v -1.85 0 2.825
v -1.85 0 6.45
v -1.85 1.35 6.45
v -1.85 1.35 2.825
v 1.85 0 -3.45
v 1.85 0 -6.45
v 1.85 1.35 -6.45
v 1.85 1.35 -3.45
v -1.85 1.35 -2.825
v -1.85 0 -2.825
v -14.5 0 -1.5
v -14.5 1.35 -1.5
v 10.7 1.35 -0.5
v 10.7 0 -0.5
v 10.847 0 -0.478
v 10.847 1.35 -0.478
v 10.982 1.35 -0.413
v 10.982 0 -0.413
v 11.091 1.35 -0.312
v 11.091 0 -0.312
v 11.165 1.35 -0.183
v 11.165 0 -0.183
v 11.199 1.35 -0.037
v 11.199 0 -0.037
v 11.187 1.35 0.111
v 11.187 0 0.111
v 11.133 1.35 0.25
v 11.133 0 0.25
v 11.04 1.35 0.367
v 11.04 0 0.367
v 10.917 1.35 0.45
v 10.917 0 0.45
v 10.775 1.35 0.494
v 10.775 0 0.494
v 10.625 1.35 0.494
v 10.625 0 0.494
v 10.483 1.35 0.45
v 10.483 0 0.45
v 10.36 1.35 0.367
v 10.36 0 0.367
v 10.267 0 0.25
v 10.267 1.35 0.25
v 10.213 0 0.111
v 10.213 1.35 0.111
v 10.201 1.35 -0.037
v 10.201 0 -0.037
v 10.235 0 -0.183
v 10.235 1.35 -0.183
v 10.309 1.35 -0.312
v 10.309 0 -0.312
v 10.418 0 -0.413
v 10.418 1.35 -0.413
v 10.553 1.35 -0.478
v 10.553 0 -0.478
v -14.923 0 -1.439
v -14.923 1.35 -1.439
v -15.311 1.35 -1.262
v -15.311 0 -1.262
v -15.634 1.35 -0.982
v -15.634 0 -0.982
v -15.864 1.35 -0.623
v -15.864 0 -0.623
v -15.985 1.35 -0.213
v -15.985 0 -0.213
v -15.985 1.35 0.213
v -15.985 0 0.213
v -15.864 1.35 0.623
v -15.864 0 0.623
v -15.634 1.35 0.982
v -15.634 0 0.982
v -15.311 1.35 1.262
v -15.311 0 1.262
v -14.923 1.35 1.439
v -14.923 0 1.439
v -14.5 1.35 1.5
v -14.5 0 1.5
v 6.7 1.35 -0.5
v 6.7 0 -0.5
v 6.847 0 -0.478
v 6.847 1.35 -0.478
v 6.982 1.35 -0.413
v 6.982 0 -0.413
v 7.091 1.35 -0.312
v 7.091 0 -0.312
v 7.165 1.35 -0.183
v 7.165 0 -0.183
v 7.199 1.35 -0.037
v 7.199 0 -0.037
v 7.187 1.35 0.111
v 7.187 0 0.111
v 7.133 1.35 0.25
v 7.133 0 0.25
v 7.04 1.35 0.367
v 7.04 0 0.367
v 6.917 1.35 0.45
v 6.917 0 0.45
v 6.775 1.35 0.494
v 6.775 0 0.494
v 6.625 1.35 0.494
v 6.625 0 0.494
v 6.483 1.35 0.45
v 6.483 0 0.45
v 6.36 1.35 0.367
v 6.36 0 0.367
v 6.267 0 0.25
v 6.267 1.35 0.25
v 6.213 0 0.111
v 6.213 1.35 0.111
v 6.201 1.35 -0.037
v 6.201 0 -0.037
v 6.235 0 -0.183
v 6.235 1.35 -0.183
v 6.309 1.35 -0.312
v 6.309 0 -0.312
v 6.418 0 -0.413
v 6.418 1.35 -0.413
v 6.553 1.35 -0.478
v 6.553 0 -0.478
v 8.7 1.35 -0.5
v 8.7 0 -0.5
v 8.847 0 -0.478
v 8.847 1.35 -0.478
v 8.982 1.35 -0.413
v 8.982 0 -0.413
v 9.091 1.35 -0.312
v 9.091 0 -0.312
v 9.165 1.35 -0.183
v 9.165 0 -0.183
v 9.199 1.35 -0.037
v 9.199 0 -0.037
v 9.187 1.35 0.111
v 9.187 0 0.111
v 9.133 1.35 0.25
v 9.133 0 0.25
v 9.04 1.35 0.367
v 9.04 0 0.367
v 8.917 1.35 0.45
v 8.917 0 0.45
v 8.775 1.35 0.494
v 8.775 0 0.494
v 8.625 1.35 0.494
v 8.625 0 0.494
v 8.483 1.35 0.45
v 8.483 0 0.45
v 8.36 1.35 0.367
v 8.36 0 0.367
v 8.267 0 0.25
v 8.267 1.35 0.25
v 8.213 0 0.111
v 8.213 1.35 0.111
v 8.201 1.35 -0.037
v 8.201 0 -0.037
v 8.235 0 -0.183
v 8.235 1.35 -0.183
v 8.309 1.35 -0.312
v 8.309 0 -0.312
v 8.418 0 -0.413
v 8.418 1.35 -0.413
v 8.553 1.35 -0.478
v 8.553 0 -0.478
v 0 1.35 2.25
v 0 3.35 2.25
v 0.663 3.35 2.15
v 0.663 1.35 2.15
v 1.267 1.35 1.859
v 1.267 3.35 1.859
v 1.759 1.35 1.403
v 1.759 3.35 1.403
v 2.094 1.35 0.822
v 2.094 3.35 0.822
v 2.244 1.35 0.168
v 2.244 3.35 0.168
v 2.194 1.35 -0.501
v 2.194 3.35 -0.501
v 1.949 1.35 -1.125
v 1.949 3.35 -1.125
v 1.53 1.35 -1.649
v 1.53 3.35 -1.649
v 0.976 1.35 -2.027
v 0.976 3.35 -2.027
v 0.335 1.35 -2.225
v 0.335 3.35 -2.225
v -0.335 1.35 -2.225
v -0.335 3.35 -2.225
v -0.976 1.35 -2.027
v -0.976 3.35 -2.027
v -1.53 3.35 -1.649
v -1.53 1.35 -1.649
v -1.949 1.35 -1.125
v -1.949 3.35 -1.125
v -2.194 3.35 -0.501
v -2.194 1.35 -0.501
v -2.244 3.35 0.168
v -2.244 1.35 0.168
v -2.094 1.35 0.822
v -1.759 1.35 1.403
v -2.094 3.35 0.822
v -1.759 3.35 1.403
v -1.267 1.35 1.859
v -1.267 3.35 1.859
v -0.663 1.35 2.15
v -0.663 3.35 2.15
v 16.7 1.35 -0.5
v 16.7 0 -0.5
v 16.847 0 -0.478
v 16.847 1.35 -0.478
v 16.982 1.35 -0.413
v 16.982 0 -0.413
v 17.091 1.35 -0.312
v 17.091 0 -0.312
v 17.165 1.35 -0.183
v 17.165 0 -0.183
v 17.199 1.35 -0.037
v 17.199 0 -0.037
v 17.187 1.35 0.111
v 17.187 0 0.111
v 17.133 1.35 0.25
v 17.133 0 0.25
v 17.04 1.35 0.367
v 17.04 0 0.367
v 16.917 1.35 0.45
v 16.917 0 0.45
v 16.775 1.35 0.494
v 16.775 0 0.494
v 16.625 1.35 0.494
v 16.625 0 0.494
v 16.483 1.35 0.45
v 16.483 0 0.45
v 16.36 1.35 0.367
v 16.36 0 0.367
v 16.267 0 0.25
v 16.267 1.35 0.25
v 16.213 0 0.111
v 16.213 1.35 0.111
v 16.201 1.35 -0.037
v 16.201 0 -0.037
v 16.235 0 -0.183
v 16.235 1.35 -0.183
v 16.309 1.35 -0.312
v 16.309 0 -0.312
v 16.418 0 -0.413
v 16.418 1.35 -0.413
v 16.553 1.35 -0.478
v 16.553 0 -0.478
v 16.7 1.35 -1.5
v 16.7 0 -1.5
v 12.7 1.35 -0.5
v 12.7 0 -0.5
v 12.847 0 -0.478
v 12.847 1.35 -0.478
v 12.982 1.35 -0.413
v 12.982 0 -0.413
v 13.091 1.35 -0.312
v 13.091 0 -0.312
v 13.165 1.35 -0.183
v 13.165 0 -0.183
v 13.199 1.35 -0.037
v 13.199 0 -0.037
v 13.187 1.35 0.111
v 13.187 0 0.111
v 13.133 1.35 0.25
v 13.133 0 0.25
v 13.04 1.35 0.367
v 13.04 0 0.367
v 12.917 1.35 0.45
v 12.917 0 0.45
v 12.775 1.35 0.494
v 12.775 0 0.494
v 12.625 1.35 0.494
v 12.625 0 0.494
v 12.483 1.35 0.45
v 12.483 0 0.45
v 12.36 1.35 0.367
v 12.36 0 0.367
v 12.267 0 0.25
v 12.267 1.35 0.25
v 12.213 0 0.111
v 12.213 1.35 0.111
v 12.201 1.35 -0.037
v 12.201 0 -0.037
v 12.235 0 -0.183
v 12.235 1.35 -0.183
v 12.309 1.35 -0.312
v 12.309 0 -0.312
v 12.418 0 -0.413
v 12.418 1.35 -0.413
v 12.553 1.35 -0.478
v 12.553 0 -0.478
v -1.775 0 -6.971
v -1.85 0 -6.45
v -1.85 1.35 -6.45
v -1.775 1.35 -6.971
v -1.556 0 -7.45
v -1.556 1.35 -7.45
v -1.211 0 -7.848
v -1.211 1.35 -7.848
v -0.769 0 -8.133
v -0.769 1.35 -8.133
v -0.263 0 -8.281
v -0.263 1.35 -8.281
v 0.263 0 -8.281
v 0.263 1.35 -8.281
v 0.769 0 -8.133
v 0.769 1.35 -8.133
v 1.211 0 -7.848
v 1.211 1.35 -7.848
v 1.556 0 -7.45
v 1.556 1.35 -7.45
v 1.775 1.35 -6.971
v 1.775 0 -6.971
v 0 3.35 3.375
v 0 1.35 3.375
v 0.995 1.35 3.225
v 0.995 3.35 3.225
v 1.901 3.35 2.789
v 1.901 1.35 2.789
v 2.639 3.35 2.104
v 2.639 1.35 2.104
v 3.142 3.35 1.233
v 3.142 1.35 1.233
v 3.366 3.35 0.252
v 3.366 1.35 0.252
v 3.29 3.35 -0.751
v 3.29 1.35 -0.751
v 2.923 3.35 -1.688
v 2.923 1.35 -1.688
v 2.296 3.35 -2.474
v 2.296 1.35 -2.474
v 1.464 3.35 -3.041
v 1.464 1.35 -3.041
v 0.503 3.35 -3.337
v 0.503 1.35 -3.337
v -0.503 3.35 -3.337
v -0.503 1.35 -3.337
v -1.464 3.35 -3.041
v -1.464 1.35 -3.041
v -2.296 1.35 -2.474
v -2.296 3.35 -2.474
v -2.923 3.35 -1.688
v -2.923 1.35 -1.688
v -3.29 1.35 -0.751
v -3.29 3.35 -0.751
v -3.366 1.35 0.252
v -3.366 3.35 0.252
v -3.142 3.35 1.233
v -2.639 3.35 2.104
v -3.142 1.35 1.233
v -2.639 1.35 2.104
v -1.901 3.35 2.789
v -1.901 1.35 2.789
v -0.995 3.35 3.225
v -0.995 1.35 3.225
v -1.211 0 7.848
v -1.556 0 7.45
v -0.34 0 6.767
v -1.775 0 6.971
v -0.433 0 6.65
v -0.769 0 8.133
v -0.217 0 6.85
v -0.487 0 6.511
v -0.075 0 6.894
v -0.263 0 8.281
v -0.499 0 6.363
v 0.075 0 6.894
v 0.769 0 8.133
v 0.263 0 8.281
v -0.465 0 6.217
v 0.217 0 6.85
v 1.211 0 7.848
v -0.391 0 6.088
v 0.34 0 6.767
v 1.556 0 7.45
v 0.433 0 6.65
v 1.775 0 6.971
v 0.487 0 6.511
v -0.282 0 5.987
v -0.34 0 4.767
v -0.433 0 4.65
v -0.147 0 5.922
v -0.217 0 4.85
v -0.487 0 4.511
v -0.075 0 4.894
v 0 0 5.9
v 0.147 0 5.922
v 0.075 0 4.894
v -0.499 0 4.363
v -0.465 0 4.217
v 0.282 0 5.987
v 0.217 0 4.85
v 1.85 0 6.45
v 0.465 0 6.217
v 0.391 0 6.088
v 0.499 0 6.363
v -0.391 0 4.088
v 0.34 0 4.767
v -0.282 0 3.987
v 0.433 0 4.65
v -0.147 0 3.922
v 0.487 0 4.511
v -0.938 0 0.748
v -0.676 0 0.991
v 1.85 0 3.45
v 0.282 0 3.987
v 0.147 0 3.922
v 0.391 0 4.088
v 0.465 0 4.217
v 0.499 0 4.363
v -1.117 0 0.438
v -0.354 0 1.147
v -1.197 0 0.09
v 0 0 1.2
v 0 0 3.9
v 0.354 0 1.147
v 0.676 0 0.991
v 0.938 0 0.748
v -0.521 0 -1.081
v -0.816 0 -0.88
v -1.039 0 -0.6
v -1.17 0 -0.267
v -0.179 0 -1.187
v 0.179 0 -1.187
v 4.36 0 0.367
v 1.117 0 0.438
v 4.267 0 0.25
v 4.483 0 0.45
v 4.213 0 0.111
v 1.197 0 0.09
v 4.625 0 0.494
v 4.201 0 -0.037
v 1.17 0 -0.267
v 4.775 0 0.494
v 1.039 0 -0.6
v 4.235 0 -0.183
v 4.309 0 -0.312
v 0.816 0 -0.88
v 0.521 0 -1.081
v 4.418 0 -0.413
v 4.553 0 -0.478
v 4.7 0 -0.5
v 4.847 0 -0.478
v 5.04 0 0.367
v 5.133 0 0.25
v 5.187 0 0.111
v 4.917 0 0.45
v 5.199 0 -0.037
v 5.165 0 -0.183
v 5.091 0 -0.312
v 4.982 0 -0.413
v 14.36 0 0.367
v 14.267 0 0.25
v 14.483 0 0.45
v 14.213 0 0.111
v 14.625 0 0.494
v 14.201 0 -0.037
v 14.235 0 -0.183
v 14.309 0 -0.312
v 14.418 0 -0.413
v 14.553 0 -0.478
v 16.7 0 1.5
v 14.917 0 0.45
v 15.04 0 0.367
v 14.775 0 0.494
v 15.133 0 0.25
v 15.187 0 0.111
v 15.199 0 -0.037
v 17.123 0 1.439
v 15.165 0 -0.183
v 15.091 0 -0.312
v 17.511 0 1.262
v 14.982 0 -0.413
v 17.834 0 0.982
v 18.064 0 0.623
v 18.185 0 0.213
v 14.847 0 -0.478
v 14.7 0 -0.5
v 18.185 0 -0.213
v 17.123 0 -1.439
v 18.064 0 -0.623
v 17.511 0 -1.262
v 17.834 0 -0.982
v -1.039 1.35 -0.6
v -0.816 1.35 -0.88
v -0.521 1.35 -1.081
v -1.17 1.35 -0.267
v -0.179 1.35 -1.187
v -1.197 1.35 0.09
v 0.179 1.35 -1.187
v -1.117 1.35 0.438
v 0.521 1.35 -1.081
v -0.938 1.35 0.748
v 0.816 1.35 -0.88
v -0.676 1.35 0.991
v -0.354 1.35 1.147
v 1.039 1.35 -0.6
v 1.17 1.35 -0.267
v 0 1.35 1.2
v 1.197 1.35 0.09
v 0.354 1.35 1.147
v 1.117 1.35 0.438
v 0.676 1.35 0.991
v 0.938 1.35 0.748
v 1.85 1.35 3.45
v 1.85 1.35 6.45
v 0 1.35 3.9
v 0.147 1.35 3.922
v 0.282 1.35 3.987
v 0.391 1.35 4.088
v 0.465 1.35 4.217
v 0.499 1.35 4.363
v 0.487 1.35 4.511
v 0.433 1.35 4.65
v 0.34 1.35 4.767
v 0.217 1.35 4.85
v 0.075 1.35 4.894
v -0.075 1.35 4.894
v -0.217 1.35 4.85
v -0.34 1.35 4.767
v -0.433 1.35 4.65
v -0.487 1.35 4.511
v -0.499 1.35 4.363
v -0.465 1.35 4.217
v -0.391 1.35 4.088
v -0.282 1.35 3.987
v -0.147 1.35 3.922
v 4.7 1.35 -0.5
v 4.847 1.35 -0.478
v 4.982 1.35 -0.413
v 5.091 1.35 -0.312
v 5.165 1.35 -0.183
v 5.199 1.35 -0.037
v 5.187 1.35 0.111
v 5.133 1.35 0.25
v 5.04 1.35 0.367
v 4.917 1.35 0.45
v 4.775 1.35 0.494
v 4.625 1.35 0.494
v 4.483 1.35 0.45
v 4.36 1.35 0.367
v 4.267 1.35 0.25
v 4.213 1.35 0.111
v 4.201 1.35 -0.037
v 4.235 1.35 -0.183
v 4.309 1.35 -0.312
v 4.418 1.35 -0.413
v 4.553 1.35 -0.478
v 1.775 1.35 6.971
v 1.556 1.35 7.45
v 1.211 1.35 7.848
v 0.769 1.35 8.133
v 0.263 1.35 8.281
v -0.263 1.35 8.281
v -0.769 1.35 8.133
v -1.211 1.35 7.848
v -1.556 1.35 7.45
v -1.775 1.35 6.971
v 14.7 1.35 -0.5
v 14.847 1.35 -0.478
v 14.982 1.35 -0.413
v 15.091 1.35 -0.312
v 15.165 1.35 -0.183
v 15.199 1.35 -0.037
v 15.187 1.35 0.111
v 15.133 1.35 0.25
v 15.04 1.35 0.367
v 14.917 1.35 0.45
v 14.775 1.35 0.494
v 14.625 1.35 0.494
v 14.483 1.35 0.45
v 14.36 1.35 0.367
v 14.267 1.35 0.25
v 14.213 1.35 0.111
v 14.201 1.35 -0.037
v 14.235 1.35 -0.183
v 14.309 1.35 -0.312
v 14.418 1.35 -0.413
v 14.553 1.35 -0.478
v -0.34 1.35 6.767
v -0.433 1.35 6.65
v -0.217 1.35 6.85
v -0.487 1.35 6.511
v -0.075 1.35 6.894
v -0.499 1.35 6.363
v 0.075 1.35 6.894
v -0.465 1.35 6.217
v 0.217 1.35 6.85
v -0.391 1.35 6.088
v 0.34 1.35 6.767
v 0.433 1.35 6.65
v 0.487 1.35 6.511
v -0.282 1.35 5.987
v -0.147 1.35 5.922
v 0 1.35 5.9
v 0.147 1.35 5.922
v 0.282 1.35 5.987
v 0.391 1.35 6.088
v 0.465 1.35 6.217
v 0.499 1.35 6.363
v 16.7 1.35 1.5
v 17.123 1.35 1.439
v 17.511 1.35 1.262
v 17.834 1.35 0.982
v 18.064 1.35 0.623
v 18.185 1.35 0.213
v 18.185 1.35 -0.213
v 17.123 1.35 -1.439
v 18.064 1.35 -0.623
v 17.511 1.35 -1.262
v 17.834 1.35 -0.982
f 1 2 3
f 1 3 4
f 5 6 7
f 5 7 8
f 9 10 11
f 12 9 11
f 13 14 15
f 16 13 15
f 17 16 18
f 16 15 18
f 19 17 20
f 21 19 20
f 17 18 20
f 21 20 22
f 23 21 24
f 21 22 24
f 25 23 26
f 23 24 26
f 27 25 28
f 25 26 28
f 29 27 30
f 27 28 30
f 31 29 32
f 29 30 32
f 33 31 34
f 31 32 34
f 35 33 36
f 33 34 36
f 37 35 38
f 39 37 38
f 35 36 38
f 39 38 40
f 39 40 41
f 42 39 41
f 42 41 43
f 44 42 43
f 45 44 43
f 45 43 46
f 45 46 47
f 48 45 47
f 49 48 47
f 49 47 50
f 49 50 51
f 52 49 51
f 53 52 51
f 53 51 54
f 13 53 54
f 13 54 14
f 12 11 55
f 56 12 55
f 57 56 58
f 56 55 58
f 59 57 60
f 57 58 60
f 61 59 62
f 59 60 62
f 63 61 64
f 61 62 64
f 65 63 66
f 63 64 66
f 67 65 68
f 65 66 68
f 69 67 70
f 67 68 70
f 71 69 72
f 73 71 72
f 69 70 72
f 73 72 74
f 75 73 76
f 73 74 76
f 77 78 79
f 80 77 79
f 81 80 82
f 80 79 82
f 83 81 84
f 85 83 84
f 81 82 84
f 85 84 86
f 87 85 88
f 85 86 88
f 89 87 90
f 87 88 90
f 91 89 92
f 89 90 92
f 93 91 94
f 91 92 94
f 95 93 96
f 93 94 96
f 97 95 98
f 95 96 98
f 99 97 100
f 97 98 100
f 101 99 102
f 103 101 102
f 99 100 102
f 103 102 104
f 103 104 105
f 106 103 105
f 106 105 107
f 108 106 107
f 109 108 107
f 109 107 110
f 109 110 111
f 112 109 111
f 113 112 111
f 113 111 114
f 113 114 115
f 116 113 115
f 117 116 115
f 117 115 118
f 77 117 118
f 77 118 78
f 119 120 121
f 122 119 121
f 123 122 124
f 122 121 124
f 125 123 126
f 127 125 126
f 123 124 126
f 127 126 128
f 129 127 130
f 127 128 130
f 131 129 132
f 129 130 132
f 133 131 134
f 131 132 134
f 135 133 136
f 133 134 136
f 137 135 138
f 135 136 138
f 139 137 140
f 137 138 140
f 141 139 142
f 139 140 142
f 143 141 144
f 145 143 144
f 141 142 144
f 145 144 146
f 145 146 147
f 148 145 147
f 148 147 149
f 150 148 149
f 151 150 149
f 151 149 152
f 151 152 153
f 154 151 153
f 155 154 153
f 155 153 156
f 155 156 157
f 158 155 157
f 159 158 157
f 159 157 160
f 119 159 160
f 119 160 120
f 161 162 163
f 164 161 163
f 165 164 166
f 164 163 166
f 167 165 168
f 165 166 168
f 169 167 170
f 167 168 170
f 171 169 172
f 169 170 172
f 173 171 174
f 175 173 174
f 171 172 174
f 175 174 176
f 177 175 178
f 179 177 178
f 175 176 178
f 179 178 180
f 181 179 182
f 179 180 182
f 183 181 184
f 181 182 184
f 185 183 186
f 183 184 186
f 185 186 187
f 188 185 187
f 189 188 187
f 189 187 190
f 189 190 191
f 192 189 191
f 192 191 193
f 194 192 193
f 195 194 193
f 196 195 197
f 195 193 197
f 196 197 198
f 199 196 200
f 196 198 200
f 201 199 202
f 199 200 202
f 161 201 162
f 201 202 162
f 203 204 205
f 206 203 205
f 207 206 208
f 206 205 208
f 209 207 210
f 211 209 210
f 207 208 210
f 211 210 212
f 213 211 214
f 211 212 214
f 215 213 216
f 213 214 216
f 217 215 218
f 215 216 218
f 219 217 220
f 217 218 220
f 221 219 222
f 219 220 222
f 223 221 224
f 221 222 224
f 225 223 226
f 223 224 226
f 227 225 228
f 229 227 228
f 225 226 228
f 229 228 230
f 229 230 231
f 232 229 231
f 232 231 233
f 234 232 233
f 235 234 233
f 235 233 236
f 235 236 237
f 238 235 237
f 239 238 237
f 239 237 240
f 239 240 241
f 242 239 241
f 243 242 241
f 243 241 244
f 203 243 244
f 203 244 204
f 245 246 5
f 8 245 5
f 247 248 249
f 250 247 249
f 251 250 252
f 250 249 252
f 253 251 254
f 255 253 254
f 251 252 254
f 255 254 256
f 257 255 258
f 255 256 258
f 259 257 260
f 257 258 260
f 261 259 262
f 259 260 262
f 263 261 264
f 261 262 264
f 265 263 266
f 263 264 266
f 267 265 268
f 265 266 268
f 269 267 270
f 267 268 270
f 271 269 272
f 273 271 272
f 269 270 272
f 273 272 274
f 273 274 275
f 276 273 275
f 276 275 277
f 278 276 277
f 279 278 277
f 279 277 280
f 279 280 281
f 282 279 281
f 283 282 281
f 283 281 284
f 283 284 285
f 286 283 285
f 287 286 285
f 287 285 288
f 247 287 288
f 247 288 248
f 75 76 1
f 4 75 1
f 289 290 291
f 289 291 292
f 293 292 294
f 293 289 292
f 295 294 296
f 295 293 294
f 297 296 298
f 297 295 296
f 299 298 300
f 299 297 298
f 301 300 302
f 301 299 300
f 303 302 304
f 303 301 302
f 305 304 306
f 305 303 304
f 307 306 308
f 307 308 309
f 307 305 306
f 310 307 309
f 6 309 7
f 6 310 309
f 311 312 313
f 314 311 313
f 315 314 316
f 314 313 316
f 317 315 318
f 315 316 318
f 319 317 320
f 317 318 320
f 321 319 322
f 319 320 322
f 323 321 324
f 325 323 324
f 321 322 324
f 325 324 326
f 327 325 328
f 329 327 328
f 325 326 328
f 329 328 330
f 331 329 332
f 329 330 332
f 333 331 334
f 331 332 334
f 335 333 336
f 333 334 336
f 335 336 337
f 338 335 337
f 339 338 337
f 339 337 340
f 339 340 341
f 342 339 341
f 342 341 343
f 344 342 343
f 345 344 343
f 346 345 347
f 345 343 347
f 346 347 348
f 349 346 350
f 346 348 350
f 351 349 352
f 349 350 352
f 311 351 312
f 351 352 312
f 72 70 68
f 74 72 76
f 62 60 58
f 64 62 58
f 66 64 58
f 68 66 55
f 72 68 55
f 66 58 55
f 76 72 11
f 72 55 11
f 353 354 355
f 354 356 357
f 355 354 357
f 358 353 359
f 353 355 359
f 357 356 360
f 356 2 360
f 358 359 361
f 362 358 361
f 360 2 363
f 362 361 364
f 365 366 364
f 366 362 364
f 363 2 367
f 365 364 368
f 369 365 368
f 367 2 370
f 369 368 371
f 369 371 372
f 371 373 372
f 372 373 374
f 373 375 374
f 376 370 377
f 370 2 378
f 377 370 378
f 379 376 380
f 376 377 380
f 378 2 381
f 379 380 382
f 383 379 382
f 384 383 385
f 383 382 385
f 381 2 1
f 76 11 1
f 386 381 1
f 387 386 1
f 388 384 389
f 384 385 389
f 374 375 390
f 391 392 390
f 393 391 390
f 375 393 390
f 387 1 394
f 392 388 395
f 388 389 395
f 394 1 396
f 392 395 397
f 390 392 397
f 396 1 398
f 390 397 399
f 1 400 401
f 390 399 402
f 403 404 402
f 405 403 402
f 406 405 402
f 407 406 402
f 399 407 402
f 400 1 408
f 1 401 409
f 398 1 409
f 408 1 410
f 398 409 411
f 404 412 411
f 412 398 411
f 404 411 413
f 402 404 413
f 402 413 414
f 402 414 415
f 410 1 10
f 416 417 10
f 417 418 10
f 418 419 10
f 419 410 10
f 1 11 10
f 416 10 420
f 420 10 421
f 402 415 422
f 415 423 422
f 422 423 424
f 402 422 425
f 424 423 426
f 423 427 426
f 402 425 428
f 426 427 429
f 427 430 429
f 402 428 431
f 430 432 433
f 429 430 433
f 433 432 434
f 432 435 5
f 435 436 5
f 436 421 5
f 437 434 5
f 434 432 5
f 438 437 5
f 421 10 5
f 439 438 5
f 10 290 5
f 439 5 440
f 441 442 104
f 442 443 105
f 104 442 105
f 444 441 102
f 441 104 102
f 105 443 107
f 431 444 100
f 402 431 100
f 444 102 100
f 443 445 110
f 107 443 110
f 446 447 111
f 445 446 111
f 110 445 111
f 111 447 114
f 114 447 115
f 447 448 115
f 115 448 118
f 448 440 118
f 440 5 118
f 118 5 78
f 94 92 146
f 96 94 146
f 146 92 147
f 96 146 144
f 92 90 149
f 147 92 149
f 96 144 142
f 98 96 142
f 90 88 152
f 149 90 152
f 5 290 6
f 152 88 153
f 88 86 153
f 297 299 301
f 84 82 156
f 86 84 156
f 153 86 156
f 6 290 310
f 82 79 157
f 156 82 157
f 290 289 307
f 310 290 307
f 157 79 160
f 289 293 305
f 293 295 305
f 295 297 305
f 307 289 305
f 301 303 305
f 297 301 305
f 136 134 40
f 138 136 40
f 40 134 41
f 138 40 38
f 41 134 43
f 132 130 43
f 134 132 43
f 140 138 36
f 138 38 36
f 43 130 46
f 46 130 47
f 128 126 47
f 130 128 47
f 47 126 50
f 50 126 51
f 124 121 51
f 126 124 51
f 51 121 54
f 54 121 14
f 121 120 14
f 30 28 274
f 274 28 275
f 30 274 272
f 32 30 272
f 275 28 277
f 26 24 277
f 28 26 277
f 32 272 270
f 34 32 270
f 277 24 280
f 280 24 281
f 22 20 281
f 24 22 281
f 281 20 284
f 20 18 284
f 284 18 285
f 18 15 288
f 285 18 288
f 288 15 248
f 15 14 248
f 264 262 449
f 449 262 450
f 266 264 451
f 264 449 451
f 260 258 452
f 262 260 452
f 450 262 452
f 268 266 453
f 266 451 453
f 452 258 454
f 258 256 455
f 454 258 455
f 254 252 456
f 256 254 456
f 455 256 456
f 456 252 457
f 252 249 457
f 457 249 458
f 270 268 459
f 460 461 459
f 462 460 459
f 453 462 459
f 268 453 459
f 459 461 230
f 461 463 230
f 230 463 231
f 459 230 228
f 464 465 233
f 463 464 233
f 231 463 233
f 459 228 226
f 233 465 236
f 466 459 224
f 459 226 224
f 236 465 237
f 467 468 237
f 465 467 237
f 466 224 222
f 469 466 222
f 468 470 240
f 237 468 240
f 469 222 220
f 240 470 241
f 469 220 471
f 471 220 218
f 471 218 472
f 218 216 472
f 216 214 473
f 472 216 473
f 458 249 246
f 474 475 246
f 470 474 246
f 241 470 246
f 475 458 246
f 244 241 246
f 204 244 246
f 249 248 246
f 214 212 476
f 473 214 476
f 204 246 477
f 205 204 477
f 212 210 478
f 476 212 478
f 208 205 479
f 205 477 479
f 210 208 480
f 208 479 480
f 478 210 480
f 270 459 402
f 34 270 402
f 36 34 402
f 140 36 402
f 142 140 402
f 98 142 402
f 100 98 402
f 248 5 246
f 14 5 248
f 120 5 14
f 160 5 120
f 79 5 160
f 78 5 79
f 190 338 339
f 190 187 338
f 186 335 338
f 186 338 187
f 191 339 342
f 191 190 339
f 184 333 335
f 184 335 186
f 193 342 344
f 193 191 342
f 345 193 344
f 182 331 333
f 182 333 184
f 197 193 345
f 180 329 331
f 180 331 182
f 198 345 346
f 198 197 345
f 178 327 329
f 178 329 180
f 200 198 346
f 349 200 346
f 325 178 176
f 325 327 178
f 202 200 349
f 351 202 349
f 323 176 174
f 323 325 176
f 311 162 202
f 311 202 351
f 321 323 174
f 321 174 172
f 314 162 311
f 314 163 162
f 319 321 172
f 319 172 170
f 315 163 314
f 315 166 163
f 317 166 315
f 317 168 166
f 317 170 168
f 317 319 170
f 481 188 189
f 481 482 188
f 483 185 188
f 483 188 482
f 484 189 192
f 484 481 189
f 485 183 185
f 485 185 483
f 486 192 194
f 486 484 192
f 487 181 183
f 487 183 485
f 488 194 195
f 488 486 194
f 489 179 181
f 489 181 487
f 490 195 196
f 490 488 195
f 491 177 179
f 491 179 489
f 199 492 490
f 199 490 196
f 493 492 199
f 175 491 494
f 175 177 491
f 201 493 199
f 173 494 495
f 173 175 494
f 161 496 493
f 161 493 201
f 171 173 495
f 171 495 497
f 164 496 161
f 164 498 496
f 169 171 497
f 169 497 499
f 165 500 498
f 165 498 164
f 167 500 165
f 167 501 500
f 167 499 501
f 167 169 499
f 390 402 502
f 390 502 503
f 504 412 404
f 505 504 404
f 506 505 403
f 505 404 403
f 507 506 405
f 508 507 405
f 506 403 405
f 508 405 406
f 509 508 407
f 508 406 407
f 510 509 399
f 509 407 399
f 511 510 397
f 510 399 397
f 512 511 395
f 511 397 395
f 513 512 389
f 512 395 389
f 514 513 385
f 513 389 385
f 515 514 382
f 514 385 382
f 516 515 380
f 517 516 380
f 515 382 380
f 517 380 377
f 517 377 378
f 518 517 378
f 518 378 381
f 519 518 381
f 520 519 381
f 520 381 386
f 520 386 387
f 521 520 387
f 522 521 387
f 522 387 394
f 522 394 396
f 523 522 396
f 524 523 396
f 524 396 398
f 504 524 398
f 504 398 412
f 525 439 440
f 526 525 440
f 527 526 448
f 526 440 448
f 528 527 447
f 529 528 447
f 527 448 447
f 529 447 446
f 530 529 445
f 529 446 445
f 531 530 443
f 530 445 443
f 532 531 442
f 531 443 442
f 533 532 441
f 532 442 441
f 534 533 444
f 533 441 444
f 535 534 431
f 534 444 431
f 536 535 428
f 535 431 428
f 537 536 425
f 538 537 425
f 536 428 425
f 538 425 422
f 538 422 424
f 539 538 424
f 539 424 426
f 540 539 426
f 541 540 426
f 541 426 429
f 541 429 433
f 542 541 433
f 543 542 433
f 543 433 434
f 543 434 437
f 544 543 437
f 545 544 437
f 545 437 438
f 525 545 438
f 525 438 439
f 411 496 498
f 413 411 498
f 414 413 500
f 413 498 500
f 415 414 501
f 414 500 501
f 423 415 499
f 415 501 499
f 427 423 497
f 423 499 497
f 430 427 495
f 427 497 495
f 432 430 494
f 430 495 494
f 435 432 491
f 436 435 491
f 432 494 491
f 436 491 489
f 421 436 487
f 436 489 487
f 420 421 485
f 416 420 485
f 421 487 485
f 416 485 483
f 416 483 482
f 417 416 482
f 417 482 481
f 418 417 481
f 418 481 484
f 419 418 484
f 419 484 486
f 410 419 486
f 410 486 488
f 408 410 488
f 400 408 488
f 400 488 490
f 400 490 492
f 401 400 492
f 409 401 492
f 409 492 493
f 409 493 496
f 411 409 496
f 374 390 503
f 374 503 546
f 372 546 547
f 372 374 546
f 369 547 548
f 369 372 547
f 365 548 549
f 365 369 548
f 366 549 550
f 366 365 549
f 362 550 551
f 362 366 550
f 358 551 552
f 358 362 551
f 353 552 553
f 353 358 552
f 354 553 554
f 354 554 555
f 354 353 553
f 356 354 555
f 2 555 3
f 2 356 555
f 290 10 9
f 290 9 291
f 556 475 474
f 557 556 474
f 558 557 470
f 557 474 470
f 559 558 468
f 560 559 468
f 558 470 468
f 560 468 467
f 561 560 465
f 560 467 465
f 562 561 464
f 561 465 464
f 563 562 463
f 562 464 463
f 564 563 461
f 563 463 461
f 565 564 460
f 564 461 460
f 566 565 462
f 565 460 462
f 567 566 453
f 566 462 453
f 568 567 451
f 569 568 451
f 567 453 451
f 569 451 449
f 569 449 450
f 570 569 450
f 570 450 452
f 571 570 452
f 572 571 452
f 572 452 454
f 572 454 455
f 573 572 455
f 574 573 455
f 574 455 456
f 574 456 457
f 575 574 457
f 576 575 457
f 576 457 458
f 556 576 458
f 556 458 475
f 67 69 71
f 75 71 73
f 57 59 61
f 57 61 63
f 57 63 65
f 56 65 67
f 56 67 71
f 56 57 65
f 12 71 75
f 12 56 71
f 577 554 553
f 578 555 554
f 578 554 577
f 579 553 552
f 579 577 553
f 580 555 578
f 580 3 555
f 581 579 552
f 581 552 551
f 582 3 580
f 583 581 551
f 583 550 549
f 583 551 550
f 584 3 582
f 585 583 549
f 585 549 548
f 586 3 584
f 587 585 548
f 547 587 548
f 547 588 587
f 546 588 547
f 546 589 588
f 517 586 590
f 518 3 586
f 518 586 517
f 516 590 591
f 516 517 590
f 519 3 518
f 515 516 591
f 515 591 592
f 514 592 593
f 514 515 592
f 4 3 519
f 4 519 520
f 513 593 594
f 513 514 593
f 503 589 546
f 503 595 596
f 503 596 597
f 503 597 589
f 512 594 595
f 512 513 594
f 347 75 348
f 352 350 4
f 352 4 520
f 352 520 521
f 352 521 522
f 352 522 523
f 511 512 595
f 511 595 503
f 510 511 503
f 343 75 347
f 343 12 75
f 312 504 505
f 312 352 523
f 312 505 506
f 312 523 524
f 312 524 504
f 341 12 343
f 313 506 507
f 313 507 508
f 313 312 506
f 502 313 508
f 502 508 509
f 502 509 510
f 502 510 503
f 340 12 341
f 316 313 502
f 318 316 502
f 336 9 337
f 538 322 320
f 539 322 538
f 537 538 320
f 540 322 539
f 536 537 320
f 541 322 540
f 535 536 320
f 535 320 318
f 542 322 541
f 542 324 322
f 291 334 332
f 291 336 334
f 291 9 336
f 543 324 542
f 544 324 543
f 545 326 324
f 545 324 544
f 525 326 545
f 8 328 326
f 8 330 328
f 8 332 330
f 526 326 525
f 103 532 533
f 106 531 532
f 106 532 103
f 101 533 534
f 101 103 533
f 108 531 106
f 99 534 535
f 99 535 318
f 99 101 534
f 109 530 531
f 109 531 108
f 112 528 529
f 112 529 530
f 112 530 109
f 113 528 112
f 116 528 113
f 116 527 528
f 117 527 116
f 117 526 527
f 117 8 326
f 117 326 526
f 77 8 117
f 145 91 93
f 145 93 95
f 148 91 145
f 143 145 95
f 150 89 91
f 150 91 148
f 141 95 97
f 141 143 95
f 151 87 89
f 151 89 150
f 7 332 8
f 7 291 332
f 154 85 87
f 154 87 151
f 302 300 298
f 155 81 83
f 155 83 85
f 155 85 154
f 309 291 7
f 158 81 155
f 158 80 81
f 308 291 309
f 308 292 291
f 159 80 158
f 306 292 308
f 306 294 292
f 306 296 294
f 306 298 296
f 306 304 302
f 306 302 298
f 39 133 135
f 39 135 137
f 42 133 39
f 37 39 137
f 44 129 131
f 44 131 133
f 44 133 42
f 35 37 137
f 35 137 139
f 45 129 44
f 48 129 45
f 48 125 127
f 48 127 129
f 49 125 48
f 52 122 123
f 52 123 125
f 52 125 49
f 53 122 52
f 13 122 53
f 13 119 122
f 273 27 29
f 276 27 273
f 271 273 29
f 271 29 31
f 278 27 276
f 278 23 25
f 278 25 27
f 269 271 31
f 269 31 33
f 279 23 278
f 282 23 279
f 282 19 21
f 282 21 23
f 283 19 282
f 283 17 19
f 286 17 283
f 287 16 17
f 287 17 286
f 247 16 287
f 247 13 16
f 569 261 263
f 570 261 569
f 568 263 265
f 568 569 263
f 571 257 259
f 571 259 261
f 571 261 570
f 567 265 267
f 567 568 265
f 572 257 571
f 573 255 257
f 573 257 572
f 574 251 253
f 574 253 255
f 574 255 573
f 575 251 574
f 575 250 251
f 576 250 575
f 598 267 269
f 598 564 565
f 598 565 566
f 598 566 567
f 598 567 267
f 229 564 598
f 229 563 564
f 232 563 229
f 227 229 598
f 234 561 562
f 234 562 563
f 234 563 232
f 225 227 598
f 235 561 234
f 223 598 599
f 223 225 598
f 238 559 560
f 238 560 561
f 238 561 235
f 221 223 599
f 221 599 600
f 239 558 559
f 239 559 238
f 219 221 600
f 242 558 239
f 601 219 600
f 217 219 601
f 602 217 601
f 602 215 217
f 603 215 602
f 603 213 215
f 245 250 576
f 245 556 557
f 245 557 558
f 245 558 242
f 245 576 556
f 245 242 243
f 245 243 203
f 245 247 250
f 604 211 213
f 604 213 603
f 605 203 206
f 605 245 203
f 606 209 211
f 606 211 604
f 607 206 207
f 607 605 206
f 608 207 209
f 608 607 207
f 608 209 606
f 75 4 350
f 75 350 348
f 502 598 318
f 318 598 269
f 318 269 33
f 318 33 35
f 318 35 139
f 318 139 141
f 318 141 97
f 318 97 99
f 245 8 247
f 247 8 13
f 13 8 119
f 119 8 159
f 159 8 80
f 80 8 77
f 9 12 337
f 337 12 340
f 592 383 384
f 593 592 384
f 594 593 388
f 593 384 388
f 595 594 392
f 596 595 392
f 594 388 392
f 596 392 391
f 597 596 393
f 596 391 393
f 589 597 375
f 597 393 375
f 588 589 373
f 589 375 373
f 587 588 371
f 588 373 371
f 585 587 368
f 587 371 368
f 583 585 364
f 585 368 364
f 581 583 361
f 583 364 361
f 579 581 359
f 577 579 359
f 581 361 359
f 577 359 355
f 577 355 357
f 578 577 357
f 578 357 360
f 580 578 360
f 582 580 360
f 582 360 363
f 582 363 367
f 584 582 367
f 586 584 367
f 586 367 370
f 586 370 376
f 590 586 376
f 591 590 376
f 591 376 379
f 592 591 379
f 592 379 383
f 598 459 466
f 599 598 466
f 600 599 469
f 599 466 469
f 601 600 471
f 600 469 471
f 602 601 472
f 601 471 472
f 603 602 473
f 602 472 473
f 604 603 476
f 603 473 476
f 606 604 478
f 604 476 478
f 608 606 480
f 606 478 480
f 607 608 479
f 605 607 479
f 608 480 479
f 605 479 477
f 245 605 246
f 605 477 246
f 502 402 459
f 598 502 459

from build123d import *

# Parameters (mm, degrees)
SCHIZZO1_R                   = 3.375
ESTRUSIONE_ESTRUSIONE1_DEPTH = 1.35
SCHIZZO2_R                   = 3.375
ESTRUSIONE_ESTRUSIONE2_DEPTH = 2
SCHIZZO3_R                   = 2.25
TAGLIO_ESTRUSIONE1_DEPTH     = 2
SCHIZZO4_R                   = 1.2
TAGLIO_ESTRUSIONE2_DEPTH     = 21.102984853
SCHIZZO5_R                   = 0.5
TAGLIO_ESTRUSIONE3_DEPTH     = 21.281826841


with BuildPart() as part:
    # Schizzo1 → Estrusione-Estrusione1 (new body)
    with BuildSketch(Plane(origin=(0, 0, 0), x_dir=(1, 0, 0), z_dir=(0, 1, 0))):
        Circle(SCHIZZO1_R)
        with BuildLine():
            Line((-1.846618531, 2.825), (-14.5, 1.5))
            ThreePointArc((-14.5, 1.5), (-16, 0), (-14.5, -1.5))
            Line((-14.5, -1.5), (-1.846618531, -2.825))
            Line((-1.846618531, -2.825), (-1.846618531, 2.825))
        make_face()
        with BuildLine():
            Line((1.85, 3.45), (1.85, -3.45))
            Line((1.85, -3.45), (16.7, -1.5))
            ThreePointArc((16.7, -1.5), (18.2, 0), (16.7, 1.5))
            Line((16.7, 1.5), (1.85, 3.45))
        make_face()
        with BuildLine():
            Line((-1.85, -6.45), (-1.85, 6.45))
            ThreePointArc((-1.85, 6.45), (0, 8.3), (1.85, 6.45))
            Line((1.85, 6.45), (1.85, -6.45))
            ThreePointArc((1.85, -6.45), (0, -8.3), (-1.85, -6.45))
        make_face()
    extrude(amount=ESTRUSIONE_ESTRUSIONE1_DEPTH)

    # Schizzo2 → Estrusione-Estrusione2 (add)
    with BuildSketch(Plane(origin=(0, 1.35, 0), x_dir=(1, 0, 0), z_dir=(0, 1, 0))):
        with Locations(Location((0, 0, 0), (0, 0, 270))):
            Circle(SCHIZZO2_R)
    extrude(amount=ESTRUSIONE_ESTRUSIONE2_DEPTH)

    # Schizzo3 → Taglio-Estrusione1 (cut)
    with BuildSketch(Plane(origin=(0, 3.35, 0), x_dir=(1, 0, 0), z_dir=(0, 1, 0))):
        with Locations(Location((0, 0, 0), (0, 0, 270))):
            Circle(SCHIZZO3_R)
    extrude(amount=-TAGLIO_ESTRUSIONE1_DEPTH, mode=Mode.SUBTRACT)

    # Schizzo4 → Taglio-Estrusione2 (cut, through all)
    with BuildSketch(Plane(origin=(0, 1.35, 0), x_dir=(1, 0, 0), z_dir=(0, 1, 0))):
        with Locations(Location((0, 0, 0), (0, 0, 270))):
            Circle(SCHIZZO4_R)
    extrude(amount=-TAGLIO_ESTRUSIONE2_DEPTH, mode=Mode.SUBTRACT)

    # Schizzo5 → Taglio-Estrusione3 (cut, through all)
    with BuildSketch(Plane.XZ):
        with Locations(Location((8.7, 0, 0), (0, 0, 270))):
            Circle(SCHIZZO5_R)
        with Locations(Location((10.7, 0, 0), (0, 0, 270))):
            Circle(SCHIZZO5_R)
        with Locations(Location((12.7, 0, 0), (0, 0, 270))):
            Circle(SCHIZZO5_R)
        with Locations(Location((14.7, 0, 0), (0, 0, 270))):
            Circle(SCHIZZO5_R)
        with Locations(Location((16.7, 0, 0), (0, 0, 270))):
            Circle(SCHIZZO5_R)
        with Locations(Location((6.7, 0, 0), (0, 0, 270))):
            Circle(SCHIZZO5_R)
        with Locations(Location((4.7, 0, 0), (0, 0, 270))):
            Circle(SCHIZZO5_R)
        with Locations(Location((0, 4.4, 0), (0, 0, 270))):
            Circle(SCHIZZO5_R)
        with Locations(Location((0, 6.4, 0), (0, 0, 270))):
            Circle(SCHIZZO5_R)
    extrude(amount=-TAGLIO_ESTRUSIONE3_DEPTH, mode=Mode.SUBTRACT)


solid = part.part
